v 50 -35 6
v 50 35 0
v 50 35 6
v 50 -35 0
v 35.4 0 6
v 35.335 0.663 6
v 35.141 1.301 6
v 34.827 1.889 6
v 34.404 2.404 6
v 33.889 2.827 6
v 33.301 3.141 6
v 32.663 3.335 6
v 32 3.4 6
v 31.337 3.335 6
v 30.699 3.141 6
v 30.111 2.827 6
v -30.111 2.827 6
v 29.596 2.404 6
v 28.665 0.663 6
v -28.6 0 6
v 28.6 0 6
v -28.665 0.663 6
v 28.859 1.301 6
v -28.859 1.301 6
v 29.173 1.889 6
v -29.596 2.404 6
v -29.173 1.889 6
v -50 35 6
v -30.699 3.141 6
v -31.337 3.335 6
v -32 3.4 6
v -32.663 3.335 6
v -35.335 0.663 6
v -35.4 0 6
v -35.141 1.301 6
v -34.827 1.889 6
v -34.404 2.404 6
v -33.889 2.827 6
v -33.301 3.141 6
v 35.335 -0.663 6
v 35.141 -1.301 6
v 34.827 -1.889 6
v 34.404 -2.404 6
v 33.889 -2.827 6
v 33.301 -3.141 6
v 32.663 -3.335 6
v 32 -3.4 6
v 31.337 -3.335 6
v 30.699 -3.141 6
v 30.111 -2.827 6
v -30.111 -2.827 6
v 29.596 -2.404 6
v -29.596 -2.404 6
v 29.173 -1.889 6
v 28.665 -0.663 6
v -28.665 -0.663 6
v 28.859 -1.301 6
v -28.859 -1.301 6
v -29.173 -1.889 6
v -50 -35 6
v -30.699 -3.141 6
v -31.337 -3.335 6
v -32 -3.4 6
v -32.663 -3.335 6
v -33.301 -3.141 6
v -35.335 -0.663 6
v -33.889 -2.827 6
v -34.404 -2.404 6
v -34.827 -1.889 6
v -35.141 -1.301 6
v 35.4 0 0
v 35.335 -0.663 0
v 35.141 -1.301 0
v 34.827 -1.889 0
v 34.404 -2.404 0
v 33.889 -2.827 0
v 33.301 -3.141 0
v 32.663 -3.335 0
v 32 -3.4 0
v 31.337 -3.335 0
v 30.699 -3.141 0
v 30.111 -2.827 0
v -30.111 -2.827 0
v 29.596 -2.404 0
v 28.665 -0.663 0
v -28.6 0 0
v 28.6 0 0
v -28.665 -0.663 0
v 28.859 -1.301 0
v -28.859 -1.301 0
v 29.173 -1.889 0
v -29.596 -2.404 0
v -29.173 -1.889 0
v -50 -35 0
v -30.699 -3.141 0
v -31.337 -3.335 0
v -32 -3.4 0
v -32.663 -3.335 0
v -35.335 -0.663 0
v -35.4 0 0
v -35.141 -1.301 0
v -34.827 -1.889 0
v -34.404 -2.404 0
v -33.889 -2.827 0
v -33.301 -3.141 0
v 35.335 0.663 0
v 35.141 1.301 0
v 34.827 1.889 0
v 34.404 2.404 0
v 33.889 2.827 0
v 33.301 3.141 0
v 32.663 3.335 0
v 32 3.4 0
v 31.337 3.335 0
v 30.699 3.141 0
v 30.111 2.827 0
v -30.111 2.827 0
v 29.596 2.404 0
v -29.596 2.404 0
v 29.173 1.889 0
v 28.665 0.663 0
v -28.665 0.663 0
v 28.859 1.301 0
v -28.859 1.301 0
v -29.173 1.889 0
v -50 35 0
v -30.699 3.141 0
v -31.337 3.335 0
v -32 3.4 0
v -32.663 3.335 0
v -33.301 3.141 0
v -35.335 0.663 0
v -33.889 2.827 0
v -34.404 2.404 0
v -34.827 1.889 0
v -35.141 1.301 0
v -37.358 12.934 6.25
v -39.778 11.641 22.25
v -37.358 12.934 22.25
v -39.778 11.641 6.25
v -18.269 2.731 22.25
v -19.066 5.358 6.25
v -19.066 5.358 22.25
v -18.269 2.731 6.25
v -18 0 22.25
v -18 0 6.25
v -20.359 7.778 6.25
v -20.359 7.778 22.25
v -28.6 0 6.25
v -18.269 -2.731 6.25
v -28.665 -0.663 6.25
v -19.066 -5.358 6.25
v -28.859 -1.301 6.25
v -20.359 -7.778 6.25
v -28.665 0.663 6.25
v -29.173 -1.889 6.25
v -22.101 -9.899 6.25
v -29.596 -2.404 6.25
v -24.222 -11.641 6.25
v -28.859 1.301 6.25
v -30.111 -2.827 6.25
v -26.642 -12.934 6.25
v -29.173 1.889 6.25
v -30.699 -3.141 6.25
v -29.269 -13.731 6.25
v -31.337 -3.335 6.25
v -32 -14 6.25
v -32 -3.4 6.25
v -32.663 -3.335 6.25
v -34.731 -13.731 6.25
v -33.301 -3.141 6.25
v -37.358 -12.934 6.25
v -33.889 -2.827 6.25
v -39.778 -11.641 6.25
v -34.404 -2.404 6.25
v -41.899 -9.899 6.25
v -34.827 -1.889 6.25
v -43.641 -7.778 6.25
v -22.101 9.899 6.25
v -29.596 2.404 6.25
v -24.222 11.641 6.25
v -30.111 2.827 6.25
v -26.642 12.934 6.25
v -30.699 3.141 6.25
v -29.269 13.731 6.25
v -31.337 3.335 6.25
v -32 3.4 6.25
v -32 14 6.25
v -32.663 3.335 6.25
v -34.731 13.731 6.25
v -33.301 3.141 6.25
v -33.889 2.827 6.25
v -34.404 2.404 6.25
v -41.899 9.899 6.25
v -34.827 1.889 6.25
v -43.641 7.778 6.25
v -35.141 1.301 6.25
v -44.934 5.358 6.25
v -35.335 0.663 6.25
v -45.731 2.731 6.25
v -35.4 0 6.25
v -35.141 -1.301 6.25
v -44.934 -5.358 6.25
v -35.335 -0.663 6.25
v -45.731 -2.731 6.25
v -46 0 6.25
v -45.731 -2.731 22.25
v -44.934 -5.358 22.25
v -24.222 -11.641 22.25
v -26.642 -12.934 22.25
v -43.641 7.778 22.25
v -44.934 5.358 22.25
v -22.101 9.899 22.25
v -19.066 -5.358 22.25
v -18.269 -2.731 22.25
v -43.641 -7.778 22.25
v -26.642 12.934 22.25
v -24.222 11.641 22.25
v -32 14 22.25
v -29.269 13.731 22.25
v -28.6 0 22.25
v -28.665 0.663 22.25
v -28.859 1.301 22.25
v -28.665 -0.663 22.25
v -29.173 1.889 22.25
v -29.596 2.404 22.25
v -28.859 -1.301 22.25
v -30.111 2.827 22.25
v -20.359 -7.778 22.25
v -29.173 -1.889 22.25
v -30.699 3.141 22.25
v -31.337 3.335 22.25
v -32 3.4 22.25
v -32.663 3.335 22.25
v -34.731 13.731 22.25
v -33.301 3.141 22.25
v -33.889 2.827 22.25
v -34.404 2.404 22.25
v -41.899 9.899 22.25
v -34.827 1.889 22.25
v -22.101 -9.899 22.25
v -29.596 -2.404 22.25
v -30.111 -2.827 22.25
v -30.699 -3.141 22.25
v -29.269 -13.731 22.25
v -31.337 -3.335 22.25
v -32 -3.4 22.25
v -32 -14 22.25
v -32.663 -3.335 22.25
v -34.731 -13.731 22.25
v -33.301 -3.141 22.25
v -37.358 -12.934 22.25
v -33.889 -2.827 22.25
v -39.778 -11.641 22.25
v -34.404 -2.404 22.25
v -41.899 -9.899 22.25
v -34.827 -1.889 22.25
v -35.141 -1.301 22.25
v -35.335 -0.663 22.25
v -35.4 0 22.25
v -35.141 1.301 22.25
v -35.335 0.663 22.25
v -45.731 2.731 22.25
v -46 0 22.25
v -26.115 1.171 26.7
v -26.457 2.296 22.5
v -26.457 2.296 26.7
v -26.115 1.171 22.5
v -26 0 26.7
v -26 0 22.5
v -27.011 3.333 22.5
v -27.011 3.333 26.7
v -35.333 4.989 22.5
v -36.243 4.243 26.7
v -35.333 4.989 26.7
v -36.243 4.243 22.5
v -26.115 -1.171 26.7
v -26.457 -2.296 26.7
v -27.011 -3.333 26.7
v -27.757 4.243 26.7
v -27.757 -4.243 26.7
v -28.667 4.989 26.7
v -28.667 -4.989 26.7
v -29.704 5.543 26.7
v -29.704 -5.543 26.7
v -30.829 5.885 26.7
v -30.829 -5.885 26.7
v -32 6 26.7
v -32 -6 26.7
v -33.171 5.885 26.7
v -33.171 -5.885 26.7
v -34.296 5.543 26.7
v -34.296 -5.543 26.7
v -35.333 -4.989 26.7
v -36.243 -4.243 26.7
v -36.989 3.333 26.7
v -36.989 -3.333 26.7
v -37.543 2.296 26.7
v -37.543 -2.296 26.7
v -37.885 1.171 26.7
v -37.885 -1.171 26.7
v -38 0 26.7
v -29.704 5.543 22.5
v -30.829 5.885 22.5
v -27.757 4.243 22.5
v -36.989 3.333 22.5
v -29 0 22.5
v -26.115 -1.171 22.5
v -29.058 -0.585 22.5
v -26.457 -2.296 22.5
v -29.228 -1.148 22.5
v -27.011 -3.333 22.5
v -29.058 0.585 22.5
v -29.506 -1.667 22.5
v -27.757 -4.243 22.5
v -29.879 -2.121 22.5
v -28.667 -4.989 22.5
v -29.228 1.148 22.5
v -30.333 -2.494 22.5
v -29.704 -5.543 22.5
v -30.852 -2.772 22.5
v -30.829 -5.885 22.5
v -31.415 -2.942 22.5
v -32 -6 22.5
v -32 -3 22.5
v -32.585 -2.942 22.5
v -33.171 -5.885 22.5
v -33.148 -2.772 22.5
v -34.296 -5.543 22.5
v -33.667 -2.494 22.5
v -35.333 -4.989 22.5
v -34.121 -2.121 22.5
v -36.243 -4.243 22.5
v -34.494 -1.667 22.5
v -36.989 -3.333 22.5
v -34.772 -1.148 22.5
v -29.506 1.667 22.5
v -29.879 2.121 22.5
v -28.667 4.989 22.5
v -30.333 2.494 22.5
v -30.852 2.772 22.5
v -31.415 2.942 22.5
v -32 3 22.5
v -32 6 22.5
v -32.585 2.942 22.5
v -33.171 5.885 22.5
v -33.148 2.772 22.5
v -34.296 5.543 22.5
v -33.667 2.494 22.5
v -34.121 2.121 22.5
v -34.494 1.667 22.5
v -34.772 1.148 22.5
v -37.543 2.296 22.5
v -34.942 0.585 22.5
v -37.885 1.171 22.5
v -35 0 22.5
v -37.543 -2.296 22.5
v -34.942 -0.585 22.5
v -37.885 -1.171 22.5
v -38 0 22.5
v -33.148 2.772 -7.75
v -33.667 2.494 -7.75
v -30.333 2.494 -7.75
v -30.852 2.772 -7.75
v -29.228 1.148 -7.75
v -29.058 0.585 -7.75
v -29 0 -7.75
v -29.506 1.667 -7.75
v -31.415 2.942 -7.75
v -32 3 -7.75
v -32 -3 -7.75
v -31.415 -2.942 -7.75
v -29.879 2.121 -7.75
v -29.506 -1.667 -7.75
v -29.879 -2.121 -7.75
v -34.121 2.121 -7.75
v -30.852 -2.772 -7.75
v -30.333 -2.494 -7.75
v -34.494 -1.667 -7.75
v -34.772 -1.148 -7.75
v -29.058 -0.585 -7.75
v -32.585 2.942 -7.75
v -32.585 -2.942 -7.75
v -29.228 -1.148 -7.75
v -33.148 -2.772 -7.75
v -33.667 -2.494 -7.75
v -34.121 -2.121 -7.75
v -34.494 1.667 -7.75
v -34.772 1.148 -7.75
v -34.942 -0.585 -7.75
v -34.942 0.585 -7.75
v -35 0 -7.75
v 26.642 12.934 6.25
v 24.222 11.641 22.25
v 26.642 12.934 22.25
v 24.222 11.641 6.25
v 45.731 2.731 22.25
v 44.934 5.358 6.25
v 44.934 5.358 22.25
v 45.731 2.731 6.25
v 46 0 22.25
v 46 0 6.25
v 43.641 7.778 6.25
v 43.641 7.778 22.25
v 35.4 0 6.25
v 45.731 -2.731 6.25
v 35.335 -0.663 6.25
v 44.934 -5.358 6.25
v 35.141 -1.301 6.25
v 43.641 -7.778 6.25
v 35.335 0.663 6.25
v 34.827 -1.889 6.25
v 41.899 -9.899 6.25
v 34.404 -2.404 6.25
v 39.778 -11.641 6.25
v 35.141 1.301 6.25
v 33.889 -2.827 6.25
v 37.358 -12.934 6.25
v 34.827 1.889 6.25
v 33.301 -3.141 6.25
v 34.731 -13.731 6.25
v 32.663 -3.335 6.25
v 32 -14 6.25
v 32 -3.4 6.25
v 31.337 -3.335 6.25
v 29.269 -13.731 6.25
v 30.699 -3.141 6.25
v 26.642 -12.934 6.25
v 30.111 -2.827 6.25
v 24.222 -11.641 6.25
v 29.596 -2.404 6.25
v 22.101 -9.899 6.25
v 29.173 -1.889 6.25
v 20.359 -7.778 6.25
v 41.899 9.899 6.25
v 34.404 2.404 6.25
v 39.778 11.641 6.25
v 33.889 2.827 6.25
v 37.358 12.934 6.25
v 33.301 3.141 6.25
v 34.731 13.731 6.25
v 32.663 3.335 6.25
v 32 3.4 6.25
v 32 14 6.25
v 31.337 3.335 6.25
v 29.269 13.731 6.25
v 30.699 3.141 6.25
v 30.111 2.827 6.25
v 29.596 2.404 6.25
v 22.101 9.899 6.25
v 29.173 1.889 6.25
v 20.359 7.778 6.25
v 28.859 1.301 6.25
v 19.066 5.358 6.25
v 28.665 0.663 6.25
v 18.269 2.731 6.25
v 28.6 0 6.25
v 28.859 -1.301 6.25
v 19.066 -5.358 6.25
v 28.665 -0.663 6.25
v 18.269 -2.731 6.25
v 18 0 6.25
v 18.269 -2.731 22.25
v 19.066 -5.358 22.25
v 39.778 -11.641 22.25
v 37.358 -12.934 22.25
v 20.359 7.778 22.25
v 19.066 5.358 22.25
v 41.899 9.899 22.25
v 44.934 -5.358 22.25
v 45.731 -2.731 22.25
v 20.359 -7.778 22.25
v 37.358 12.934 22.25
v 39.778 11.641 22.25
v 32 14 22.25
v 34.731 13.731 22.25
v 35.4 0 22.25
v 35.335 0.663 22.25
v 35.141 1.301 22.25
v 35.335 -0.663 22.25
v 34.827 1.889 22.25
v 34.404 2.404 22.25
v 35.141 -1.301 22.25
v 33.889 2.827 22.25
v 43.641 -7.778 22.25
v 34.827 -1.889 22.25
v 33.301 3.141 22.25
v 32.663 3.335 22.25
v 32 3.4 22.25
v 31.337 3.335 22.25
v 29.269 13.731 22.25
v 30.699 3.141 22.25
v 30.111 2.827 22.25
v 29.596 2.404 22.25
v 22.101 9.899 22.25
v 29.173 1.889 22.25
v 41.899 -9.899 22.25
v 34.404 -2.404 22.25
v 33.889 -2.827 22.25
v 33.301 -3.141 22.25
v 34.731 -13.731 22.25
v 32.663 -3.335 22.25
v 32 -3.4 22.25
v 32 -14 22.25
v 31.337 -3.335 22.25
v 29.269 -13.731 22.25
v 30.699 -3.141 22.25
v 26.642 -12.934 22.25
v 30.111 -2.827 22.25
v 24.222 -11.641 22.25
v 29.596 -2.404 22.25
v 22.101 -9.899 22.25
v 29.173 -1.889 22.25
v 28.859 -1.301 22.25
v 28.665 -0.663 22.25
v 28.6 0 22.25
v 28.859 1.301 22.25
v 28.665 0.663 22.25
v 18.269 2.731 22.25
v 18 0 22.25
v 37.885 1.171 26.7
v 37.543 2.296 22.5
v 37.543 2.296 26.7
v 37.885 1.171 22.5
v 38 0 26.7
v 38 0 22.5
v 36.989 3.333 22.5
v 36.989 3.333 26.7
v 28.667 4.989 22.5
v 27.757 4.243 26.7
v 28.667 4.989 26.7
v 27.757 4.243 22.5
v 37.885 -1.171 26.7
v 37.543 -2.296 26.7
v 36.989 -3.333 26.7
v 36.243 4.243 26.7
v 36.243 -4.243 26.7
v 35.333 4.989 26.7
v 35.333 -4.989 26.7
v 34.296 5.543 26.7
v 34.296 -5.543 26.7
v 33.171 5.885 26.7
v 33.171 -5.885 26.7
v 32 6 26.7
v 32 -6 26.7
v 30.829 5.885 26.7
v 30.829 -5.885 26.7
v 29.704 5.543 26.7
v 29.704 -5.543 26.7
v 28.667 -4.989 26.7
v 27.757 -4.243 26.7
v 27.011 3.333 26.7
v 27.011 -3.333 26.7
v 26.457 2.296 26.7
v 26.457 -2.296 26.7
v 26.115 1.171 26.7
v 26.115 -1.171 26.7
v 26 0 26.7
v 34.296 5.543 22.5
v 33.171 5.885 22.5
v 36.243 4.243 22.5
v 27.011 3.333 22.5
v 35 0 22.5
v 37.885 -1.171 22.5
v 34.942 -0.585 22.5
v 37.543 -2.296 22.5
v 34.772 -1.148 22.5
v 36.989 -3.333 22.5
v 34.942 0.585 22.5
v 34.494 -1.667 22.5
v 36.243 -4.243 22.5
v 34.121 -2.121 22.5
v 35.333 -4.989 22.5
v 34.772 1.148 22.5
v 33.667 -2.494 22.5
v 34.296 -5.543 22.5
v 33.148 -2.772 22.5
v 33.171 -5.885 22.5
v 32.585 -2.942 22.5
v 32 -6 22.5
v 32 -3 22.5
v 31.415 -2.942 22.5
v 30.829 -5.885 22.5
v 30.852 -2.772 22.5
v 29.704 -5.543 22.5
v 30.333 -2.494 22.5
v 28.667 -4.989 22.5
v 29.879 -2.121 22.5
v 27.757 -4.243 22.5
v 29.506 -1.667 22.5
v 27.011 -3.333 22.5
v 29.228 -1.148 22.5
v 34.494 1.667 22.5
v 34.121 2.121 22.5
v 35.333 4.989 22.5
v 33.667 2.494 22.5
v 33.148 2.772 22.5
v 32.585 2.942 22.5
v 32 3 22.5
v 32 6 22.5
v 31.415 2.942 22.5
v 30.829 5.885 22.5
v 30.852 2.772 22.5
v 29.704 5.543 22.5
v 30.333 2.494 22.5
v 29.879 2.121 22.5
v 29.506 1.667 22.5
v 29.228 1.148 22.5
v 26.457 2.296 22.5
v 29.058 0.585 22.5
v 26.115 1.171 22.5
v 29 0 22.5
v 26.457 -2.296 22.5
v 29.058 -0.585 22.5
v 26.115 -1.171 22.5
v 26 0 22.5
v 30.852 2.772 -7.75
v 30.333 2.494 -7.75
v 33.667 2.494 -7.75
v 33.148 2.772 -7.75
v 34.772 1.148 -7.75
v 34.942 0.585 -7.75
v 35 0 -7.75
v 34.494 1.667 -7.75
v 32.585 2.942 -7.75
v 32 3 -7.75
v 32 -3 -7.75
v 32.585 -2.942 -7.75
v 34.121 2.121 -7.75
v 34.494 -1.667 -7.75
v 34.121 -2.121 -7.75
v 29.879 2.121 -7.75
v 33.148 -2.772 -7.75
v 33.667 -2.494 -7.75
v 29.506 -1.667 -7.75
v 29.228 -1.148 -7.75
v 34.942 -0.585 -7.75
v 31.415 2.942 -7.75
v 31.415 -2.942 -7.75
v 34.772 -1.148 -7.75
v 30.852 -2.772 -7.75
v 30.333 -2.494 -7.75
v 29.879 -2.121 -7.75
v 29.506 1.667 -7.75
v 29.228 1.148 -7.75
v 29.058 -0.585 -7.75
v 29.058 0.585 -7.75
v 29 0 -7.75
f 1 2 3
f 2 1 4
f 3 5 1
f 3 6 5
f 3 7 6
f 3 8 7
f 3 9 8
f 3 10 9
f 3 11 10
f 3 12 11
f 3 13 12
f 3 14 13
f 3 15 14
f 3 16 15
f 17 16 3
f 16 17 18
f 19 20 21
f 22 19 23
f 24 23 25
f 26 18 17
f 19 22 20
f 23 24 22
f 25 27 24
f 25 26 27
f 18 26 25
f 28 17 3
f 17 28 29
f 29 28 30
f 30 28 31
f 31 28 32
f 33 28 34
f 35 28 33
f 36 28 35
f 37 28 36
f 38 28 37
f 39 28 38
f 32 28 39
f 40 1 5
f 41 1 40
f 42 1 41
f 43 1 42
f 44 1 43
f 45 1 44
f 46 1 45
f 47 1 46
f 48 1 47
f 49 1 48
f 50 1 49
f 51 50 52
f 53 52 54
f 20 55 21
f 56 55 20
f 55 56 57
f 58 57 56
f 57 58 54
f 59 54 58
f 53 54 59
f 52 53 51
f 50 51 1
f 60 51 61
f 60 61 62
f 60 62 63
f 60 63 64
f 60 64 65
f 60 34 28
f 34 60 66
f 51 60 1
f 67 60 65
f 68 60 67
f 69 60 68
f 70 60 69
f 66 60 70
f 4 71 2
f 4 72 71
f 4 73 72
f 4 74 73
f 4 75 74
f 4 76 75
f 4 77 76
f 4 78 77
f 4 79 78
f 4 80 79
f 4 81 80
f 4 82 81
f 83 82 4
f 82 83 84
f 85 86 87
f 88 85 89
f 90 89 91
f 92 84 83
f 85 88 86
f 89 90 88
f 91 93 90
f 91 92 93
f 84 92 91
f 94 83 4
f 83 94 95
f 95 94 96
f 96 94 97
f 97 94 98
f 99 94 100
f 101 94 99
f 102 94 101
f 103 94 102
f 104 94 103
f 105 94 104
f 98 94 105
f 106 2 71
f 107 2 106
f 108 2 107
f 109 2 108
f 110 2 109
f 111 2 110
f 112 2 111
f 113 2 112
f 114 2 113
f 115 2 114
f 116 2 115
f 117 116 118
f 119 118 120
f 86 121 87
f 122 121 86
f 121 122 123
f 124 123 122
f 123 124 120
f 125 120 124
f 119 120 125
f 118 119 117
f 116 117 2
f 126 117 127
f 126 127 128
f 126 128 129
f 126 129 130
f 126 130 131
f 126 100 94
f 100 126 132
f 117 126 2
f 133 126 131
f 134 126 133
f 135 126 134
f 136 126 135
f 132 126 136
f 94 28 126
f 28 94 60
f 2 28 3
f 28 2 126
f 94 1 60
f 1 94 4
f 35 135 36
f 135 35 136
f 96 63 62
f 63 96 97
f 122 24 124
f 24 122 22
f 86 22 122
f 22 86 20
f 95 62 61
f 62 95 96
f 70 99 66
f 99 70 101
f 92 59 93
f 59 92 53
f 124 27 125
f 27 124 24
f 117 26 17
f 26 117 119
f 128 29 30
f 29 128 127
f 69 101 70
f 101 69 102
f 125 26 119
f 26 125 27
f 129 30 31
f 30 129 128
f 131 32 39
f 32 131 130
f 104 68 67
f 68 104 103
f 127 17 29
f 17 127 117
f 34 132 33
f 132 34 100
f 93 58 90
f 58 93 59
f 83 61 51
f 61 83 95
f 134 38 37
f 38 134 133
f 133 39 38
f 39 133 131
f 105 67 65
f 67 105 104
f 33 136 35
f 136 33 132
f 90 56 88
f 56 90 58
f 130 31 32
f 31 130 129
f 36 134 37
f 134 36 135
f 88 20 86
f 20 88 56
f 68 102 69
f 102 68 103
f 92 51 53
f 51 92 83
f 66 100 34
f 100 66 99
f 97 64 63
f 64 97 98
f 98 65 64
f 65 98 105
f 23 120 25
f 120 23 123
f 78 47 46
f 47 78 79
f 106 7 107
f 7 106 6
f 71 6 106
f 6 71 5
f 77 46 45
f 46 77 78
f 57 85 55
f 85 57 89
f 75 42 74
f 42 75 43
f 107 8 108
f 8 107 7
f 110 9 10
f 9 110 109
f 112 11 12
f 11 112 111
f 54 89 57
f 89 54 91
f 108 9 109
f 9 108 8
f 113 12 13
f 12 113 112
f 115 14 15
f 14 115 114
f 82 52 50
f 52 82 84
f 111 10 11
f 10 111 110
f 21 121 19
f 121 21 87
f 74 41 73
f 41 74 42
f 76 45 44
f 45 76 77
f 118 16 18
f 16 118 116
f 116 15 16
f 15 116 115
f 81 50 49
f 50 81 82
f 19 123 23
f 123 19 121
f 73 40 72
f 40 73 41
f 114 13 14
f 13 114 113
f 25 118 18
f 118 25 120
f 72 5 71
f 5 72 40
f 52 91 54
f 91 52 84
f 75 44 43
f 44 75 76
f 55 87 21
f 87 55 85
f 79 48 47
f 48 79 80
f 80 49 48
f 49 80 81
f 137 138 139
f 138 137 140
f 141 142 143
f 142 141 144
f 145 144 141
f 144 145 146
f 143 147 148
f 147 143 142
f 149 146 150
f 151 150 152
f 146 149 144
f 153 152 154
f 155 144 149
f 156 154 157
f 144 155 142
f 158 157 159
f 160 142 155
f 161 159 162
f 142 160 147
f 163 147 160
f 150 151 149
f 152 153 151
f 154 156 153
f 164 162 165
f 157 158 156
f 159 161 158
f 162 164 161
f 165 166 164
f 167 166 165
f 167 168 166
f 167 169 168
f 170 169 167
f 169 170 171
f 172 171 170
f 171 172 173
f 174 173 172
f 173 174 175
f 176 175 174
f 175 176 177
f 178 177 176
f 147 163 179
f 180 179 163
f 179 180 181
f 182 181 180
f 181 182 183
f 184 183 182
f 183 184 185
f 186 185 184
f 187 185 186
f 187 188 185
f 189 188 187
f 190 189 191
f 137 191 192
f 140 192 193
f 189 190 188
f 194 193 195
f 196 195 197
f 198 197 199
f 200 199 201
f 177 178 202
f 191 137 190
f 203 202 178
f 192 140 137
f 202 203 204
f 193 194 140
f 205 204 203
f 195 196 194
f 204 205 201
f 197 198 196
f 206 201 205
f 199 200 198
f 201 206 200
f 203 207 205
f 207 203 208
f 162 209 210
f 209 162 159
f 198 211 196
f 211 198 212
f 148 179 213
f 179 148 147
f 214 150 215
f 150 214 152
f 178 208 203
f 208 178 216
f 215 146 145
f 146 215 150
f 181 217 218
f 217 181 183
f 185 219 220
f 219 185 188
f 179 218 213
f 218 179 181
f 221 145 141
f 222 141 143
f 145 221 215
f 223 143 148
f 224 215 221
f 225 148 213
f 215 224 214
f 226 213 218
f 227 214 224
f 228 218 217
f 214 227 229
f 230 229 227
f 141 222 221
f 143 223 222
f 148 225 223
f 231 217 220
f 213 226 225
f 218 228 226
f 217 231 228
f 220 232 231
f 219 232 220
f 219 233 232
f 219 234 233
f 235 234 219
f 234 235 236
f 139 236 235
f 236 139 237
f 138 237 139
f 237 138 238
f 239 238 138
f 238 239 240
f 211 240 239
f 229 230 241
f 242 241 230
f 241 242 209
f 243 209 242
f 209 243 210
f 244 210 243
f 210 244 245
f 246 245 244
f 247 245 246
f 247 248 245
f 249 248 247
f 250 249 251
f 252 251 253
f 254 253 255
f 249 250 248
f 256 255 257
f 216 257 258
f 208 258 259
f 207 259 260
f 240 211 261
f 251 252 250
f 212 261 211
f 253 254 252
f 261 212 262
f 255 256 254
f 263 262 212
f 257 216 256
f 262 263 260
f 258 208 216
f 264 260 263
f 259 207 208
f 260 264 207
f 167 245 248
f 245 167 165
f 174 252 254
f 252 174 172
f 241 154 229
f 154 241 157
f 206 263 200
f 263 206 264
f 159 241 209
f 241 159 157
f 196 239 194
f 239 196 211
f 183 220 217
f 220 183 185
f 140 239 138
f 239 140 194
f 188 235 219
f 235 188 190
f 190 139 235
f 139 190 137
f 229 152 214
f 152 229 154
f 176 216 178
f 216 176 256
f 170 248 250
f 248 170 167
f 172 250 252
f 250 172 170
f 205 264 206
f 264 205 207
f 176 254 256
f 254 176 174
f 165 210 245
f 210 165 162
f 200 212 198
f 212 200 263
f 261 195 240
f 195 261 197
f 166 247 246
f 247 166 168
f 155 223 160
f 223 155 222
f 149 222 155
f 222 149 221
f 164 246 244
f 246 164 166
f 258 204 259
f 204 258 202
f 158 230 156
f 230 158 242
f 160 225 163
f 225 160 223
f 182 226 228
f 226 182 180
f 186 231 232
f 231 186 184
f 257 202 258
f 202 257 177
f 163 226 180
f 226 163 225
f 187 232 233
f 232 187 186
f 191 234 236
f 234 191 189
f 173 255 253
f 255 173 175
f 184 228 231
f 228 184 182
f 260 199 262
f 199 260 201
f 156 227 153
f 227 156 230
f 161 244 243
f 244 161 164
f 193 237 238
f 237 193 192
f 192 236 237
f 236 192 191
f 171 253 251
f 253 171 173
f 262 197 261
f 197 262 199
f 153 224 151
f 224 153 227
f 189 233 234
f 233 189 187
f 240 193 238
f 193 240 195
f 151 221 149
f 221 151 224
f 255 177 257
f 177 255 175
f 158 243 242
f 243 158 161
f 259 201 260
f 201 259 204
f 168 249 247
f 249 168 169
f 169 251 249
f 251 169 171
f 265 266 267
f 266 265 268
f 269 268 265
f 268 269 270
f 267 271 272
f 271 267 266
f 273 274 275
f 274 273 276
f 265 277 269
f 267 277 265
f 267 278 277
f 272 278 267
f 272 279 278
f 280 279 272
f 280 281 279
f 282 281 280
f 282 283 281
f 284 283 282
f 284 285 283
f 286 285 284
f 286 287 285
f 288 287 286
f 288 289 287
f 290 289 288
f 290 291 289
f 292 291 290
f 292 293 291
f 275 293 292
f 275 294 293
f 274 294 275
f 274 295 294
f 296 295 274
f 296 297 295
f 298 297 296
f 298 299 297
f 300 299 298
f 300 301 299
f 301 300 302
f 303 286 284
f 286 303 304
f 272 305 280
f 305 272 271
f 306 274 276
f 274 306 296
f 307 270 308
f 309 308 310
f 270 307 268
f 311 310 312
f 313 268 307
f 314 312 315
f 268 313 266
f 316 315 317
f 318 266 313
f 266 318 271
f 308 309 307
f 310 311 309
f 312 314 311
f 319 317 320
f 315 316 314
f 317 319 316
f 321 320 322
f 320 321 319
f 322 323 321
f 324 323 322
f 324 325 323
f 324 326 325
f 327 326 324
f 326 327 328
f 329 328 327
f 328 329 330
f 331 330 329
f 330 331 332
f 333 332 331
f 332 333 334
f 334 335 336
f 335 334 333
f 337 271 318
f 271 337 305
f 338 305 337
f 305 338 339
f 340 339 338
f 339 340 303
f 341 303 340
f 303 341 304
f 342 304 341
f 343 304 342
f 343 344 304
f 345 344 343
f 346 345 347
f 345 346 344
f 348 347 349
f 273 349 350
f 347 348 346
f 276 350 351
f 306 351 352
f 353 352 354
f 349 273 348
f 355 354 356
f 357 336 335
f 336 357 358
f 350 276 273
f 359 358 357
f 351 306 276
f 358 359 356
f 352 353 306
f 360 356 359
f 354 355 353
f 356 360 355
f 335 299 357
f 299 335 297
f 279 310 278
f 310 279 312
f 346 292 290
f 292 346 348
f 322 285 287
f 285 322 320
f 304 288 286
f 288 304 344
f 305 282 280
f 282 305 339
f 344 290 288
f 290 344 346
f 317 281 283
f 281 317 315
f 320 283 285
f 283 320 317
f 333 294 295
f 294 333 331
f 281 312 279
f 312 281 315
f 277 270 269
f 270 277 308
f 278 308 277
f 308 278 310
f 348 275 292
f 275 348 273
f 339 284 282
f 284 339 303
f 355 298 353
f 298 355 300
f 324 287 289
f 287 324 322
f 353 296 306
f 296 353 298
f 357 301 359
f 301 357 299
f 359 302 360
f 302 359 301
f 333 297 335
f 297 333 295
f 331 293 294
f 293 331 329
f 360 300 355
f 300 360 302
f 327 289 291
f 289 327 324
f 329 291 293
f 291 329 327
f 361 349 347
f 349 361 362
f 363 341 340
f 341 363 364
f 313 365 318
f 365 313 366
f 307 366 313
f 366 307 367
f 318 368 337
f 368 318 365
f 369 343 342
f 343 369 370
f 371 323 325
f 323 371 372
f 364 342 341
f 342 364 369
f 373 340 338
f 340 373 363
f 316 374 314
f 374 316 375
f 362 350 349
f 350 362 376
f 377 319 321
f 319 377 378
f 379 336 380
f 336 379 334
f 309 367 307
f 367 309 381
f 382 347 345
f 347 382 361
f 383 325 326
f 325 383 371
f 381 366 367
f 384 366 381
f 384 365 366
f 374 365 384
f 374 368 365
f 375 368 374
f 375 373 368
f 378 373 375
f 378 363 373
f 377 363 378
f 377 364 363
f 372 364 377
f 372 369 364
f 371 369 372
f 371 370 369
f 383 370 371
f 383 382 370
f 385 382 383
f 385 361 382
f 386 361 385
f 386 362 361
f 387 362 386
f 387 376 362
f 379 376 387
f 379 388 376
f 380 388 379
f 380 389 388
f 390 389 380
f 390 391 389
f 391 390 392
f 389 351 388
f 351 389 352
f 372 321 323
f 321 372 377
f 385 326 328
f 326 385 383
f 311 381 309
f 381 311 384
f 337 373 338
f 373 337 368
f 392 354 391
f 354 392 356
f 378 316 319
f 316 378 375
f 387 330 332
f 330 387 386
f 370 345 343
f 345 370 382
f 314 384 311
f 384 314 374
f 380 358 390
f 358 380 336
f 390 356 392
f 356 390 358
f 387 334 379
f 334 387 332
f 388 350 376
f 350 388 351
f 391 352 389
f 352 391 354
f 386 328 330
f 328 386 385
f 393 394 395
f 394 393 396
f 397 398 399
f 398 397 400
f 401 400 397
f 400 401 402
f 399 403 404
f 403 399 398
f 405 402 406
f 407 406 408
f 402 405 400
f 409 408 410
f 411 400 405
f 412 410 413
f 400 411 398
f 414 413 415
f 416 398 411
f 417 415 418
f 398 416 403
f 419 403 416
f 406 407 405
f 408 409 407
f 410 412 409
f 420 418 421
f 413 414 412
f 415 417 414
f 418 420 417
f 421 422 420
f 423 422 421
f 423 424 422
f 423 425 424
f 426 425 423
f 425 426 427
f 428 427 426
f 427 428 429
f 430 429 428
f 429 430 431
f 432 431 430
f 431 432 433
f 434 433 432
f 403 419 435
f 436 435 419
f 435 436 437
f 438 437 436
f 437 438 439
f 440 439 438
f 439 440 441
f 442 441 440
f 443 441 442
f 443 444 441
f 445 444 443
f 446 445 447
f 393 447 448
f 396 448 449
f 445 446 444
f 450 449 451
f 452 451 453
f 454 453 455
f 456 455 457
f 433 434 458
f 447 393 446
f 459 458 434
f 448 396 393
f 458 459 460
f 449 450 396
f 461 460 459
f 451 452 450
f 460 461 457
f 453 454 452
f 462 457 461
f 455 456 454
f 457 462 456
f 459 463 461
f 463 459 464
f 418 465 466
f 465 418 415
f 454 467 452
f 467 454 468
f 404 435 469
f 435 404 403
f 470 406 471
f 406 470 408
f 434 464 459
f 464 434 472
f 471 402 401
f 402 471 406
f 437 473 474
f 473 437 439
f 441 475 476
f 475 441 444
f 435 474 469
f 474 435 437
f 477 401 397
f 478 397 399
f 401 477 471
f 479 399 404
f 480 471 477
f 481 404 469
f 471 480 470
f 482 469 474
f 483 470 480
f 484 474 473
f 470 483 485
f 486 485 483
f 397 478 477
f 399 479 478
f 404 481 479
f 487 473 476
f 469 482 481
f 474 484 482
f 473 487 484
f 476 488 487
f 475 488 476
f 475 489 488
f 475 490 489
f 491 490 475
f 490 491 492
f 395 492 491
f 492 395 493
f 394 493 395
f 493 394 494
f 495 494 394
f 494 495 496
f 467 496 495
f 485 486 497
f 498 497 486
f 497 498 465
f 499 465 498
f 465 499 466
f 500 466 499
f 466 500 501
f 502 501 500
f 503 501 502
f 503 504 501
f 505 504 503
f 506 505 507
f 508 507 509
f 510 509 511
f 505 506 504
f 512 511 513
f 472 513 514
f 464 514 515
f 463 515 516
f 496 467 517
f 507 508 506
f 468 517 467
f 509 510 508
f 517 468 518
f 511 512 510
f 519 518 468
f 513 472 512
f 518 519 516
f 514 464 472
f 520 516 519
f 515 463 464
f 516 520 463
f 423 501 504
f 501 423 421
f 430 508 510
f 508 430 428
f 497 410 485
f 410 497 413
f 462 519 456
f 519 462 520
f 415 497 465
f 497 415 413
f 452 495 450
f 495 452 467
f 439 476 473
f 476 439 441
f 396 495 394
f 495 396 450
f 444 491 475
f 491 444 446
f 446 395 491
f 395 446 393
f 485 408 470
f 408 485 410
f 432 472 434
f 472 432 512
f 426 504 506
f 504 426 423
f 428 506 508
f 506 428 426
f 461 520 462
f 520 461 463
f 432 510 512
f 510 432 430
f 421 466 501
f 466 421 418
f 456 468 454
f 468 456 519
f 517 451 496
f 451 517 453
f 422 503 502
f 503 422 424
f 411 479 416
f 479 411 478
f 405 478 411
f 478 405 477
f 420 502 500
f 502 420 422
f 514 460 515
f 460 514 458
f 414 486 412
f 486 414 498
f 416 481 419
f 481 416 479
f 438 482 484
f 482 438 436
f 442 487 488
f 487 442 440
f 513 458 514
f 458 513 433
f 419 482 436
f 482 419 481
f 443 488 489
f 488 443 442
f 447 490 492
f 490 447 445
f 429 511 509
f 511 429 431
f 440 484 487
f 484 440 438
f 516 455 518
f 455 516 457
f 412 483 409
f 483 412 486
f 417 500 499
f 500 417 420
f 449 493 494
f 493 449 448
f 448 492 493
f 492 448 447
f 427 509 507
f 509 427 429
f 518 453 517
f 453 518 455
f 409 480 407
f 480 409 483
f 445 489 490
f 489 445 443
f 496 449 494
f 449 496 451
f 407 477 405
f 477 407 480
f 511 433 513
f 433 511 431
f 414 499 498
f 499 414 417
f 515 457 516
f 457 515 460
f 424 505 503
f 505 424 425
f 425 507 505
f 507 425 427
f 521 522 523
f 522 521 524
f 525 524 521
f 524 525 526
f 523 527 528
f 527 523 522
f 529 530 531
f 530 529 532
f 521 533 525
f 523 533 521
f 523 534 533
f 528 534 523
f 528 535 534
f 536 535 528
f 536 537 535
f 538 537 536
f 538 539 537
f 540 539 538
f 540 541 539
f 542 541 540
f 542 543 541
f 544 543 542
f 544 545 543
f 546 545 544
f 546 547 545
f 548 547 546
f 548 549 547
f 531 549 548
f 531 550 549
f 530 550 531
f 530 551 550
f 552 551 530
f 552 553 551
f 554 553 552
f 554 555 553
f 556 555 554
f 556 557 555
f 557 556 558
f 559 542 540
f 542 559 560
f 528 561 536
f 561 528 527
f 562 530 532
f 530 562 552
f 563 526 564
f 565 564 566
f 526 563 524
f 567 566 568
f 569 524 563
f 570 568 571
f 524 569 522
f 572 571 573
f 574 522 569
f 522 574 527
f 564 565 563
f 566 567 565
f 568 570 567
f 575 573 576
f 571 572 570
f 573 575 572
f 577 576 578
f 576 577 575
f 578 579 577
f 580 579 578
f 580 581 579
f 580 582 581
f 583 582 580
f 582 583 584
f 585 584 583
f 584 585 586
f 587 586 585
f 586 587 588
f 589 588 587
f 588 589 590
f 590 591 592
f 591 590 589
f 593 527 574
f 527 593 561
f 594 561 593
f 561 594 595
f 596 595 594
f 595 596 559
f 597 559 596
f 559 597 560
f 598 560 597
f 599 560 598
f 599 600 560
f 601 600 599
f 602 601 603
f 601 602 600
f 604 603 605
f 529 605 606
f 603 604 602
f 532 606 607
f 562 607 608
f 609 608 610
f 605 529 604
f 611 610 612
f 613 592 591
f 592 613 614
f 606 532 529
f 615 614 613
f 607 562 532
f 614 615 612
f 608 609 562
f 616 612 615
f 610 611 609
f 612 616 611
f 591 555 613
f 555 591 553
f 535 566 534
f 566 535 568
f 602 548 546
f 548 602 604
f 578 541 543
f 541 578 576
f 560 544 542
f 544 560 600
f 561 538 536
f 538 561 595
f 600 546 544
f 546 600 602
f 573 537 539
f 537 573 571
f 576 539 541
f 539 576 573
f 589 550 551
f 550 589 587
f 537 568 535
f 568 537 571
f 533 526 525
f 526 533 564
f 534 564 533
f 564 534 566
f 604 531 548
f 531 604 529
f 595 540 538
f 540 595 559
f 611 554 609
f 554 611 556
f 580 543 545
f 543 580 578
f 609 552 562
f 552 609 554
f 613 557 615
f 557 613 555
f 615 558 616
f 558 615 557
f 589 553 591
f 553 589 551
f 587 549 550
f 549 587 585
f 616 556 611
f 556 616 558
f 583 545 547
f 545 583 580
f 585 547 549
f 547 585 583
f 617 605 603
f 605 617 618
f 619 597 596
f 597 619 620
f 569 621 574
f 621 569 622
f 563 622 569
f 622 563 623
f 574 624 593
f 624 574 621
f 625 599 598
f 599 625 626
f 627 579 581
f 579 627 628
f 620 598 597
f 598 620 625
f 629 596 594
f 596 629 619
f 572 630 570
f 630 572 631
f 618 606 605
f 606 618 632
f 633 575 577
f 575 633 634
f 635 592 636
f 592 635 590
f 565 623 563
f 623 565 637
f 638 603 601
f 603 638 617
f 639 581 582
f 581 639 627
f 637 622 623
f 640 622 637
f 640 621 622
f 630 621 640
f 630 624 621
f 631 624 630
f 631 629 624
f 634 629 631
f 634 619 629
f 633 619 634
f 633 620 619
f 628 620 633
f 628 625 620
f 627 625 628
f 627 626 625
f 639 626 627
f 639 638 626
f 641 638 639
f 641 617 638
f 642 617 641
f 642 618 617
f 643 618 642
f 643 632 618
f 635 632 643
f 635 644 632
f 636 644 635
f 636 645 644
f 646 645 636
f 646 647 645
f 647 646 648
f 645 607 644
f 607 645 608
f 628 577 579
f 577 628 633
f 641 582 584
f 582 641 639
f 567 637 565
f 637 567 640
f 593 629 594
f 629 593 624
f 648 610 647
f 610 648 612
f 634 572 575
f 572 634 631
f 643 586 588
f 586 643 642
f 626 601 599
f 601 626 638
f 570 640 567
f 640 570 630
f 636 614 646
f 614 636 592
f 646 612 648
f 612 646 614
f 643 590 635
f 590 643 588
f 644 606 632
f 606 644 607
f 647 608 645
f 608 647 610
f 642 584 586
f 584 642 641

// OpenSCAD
$fn = 32;

// ------------------------------------------------------------------------
// Standoff columns: 2 d28 standoffs, bolts d6
// Every part is its own module, assembly() places them once.
// ------------------------------------------------------------------------

// --- part 1 ---
module base_plate() {
  difference() {
    translate([-50, -35, 0]) cube([100, 70, 6]);
    translate([-32, 0, -1]) cylinder(h = 8, d = 6.8);
    translate([32, 0, -1]) cylinder(h = 8, d = 6.8);
  }
}

// --- part 2 ---
module spacer1() {
  difference() {
      translate([0, 0, 0]) cylinder(h = 16, d = 28);
      translate([0, 0, -1]) cylinder(h = 18, d = 6.8);
    }
}

// --- part 3 ---
module bolt1() {
  cylinder(h = 4.2, d = 12);
  translate([0, 0, -30.25]) cylinder(h = 30.25, d = 6);
}

// --- part 4 ---
module spacer2() {
  difference() {
      translate([0, 0, 0]) cylinder(h = 16, d = 28);
      translate([0, 0, -1]) cylinder(h = 18, d = 6.8);
    }
}

// --- part 5 ---
module bolt2() {
  cylinder(h = 4.2, d = 12);
  translate([0, 0, -30.25]) cylinder(h = 30.25, d = 6);
}

// --- assembly ---
module assembly() {
  translate([0, 0, 0]) rotate([0, 0, 0]) base_plate();
  translate([-32, 0, 6.25]) rotate([0, 0, 0]) spacer1();
  translate([-32, 0, 22.5]) rotate([0, 0, 0]) bolt1();
  translate([32, 0, 6.25]) rotate([0, 0, 0]) spacer2();
  translate([32, 0, 22.5]) rotate([0, 0, 0]) bolt2();
}

assembly();
